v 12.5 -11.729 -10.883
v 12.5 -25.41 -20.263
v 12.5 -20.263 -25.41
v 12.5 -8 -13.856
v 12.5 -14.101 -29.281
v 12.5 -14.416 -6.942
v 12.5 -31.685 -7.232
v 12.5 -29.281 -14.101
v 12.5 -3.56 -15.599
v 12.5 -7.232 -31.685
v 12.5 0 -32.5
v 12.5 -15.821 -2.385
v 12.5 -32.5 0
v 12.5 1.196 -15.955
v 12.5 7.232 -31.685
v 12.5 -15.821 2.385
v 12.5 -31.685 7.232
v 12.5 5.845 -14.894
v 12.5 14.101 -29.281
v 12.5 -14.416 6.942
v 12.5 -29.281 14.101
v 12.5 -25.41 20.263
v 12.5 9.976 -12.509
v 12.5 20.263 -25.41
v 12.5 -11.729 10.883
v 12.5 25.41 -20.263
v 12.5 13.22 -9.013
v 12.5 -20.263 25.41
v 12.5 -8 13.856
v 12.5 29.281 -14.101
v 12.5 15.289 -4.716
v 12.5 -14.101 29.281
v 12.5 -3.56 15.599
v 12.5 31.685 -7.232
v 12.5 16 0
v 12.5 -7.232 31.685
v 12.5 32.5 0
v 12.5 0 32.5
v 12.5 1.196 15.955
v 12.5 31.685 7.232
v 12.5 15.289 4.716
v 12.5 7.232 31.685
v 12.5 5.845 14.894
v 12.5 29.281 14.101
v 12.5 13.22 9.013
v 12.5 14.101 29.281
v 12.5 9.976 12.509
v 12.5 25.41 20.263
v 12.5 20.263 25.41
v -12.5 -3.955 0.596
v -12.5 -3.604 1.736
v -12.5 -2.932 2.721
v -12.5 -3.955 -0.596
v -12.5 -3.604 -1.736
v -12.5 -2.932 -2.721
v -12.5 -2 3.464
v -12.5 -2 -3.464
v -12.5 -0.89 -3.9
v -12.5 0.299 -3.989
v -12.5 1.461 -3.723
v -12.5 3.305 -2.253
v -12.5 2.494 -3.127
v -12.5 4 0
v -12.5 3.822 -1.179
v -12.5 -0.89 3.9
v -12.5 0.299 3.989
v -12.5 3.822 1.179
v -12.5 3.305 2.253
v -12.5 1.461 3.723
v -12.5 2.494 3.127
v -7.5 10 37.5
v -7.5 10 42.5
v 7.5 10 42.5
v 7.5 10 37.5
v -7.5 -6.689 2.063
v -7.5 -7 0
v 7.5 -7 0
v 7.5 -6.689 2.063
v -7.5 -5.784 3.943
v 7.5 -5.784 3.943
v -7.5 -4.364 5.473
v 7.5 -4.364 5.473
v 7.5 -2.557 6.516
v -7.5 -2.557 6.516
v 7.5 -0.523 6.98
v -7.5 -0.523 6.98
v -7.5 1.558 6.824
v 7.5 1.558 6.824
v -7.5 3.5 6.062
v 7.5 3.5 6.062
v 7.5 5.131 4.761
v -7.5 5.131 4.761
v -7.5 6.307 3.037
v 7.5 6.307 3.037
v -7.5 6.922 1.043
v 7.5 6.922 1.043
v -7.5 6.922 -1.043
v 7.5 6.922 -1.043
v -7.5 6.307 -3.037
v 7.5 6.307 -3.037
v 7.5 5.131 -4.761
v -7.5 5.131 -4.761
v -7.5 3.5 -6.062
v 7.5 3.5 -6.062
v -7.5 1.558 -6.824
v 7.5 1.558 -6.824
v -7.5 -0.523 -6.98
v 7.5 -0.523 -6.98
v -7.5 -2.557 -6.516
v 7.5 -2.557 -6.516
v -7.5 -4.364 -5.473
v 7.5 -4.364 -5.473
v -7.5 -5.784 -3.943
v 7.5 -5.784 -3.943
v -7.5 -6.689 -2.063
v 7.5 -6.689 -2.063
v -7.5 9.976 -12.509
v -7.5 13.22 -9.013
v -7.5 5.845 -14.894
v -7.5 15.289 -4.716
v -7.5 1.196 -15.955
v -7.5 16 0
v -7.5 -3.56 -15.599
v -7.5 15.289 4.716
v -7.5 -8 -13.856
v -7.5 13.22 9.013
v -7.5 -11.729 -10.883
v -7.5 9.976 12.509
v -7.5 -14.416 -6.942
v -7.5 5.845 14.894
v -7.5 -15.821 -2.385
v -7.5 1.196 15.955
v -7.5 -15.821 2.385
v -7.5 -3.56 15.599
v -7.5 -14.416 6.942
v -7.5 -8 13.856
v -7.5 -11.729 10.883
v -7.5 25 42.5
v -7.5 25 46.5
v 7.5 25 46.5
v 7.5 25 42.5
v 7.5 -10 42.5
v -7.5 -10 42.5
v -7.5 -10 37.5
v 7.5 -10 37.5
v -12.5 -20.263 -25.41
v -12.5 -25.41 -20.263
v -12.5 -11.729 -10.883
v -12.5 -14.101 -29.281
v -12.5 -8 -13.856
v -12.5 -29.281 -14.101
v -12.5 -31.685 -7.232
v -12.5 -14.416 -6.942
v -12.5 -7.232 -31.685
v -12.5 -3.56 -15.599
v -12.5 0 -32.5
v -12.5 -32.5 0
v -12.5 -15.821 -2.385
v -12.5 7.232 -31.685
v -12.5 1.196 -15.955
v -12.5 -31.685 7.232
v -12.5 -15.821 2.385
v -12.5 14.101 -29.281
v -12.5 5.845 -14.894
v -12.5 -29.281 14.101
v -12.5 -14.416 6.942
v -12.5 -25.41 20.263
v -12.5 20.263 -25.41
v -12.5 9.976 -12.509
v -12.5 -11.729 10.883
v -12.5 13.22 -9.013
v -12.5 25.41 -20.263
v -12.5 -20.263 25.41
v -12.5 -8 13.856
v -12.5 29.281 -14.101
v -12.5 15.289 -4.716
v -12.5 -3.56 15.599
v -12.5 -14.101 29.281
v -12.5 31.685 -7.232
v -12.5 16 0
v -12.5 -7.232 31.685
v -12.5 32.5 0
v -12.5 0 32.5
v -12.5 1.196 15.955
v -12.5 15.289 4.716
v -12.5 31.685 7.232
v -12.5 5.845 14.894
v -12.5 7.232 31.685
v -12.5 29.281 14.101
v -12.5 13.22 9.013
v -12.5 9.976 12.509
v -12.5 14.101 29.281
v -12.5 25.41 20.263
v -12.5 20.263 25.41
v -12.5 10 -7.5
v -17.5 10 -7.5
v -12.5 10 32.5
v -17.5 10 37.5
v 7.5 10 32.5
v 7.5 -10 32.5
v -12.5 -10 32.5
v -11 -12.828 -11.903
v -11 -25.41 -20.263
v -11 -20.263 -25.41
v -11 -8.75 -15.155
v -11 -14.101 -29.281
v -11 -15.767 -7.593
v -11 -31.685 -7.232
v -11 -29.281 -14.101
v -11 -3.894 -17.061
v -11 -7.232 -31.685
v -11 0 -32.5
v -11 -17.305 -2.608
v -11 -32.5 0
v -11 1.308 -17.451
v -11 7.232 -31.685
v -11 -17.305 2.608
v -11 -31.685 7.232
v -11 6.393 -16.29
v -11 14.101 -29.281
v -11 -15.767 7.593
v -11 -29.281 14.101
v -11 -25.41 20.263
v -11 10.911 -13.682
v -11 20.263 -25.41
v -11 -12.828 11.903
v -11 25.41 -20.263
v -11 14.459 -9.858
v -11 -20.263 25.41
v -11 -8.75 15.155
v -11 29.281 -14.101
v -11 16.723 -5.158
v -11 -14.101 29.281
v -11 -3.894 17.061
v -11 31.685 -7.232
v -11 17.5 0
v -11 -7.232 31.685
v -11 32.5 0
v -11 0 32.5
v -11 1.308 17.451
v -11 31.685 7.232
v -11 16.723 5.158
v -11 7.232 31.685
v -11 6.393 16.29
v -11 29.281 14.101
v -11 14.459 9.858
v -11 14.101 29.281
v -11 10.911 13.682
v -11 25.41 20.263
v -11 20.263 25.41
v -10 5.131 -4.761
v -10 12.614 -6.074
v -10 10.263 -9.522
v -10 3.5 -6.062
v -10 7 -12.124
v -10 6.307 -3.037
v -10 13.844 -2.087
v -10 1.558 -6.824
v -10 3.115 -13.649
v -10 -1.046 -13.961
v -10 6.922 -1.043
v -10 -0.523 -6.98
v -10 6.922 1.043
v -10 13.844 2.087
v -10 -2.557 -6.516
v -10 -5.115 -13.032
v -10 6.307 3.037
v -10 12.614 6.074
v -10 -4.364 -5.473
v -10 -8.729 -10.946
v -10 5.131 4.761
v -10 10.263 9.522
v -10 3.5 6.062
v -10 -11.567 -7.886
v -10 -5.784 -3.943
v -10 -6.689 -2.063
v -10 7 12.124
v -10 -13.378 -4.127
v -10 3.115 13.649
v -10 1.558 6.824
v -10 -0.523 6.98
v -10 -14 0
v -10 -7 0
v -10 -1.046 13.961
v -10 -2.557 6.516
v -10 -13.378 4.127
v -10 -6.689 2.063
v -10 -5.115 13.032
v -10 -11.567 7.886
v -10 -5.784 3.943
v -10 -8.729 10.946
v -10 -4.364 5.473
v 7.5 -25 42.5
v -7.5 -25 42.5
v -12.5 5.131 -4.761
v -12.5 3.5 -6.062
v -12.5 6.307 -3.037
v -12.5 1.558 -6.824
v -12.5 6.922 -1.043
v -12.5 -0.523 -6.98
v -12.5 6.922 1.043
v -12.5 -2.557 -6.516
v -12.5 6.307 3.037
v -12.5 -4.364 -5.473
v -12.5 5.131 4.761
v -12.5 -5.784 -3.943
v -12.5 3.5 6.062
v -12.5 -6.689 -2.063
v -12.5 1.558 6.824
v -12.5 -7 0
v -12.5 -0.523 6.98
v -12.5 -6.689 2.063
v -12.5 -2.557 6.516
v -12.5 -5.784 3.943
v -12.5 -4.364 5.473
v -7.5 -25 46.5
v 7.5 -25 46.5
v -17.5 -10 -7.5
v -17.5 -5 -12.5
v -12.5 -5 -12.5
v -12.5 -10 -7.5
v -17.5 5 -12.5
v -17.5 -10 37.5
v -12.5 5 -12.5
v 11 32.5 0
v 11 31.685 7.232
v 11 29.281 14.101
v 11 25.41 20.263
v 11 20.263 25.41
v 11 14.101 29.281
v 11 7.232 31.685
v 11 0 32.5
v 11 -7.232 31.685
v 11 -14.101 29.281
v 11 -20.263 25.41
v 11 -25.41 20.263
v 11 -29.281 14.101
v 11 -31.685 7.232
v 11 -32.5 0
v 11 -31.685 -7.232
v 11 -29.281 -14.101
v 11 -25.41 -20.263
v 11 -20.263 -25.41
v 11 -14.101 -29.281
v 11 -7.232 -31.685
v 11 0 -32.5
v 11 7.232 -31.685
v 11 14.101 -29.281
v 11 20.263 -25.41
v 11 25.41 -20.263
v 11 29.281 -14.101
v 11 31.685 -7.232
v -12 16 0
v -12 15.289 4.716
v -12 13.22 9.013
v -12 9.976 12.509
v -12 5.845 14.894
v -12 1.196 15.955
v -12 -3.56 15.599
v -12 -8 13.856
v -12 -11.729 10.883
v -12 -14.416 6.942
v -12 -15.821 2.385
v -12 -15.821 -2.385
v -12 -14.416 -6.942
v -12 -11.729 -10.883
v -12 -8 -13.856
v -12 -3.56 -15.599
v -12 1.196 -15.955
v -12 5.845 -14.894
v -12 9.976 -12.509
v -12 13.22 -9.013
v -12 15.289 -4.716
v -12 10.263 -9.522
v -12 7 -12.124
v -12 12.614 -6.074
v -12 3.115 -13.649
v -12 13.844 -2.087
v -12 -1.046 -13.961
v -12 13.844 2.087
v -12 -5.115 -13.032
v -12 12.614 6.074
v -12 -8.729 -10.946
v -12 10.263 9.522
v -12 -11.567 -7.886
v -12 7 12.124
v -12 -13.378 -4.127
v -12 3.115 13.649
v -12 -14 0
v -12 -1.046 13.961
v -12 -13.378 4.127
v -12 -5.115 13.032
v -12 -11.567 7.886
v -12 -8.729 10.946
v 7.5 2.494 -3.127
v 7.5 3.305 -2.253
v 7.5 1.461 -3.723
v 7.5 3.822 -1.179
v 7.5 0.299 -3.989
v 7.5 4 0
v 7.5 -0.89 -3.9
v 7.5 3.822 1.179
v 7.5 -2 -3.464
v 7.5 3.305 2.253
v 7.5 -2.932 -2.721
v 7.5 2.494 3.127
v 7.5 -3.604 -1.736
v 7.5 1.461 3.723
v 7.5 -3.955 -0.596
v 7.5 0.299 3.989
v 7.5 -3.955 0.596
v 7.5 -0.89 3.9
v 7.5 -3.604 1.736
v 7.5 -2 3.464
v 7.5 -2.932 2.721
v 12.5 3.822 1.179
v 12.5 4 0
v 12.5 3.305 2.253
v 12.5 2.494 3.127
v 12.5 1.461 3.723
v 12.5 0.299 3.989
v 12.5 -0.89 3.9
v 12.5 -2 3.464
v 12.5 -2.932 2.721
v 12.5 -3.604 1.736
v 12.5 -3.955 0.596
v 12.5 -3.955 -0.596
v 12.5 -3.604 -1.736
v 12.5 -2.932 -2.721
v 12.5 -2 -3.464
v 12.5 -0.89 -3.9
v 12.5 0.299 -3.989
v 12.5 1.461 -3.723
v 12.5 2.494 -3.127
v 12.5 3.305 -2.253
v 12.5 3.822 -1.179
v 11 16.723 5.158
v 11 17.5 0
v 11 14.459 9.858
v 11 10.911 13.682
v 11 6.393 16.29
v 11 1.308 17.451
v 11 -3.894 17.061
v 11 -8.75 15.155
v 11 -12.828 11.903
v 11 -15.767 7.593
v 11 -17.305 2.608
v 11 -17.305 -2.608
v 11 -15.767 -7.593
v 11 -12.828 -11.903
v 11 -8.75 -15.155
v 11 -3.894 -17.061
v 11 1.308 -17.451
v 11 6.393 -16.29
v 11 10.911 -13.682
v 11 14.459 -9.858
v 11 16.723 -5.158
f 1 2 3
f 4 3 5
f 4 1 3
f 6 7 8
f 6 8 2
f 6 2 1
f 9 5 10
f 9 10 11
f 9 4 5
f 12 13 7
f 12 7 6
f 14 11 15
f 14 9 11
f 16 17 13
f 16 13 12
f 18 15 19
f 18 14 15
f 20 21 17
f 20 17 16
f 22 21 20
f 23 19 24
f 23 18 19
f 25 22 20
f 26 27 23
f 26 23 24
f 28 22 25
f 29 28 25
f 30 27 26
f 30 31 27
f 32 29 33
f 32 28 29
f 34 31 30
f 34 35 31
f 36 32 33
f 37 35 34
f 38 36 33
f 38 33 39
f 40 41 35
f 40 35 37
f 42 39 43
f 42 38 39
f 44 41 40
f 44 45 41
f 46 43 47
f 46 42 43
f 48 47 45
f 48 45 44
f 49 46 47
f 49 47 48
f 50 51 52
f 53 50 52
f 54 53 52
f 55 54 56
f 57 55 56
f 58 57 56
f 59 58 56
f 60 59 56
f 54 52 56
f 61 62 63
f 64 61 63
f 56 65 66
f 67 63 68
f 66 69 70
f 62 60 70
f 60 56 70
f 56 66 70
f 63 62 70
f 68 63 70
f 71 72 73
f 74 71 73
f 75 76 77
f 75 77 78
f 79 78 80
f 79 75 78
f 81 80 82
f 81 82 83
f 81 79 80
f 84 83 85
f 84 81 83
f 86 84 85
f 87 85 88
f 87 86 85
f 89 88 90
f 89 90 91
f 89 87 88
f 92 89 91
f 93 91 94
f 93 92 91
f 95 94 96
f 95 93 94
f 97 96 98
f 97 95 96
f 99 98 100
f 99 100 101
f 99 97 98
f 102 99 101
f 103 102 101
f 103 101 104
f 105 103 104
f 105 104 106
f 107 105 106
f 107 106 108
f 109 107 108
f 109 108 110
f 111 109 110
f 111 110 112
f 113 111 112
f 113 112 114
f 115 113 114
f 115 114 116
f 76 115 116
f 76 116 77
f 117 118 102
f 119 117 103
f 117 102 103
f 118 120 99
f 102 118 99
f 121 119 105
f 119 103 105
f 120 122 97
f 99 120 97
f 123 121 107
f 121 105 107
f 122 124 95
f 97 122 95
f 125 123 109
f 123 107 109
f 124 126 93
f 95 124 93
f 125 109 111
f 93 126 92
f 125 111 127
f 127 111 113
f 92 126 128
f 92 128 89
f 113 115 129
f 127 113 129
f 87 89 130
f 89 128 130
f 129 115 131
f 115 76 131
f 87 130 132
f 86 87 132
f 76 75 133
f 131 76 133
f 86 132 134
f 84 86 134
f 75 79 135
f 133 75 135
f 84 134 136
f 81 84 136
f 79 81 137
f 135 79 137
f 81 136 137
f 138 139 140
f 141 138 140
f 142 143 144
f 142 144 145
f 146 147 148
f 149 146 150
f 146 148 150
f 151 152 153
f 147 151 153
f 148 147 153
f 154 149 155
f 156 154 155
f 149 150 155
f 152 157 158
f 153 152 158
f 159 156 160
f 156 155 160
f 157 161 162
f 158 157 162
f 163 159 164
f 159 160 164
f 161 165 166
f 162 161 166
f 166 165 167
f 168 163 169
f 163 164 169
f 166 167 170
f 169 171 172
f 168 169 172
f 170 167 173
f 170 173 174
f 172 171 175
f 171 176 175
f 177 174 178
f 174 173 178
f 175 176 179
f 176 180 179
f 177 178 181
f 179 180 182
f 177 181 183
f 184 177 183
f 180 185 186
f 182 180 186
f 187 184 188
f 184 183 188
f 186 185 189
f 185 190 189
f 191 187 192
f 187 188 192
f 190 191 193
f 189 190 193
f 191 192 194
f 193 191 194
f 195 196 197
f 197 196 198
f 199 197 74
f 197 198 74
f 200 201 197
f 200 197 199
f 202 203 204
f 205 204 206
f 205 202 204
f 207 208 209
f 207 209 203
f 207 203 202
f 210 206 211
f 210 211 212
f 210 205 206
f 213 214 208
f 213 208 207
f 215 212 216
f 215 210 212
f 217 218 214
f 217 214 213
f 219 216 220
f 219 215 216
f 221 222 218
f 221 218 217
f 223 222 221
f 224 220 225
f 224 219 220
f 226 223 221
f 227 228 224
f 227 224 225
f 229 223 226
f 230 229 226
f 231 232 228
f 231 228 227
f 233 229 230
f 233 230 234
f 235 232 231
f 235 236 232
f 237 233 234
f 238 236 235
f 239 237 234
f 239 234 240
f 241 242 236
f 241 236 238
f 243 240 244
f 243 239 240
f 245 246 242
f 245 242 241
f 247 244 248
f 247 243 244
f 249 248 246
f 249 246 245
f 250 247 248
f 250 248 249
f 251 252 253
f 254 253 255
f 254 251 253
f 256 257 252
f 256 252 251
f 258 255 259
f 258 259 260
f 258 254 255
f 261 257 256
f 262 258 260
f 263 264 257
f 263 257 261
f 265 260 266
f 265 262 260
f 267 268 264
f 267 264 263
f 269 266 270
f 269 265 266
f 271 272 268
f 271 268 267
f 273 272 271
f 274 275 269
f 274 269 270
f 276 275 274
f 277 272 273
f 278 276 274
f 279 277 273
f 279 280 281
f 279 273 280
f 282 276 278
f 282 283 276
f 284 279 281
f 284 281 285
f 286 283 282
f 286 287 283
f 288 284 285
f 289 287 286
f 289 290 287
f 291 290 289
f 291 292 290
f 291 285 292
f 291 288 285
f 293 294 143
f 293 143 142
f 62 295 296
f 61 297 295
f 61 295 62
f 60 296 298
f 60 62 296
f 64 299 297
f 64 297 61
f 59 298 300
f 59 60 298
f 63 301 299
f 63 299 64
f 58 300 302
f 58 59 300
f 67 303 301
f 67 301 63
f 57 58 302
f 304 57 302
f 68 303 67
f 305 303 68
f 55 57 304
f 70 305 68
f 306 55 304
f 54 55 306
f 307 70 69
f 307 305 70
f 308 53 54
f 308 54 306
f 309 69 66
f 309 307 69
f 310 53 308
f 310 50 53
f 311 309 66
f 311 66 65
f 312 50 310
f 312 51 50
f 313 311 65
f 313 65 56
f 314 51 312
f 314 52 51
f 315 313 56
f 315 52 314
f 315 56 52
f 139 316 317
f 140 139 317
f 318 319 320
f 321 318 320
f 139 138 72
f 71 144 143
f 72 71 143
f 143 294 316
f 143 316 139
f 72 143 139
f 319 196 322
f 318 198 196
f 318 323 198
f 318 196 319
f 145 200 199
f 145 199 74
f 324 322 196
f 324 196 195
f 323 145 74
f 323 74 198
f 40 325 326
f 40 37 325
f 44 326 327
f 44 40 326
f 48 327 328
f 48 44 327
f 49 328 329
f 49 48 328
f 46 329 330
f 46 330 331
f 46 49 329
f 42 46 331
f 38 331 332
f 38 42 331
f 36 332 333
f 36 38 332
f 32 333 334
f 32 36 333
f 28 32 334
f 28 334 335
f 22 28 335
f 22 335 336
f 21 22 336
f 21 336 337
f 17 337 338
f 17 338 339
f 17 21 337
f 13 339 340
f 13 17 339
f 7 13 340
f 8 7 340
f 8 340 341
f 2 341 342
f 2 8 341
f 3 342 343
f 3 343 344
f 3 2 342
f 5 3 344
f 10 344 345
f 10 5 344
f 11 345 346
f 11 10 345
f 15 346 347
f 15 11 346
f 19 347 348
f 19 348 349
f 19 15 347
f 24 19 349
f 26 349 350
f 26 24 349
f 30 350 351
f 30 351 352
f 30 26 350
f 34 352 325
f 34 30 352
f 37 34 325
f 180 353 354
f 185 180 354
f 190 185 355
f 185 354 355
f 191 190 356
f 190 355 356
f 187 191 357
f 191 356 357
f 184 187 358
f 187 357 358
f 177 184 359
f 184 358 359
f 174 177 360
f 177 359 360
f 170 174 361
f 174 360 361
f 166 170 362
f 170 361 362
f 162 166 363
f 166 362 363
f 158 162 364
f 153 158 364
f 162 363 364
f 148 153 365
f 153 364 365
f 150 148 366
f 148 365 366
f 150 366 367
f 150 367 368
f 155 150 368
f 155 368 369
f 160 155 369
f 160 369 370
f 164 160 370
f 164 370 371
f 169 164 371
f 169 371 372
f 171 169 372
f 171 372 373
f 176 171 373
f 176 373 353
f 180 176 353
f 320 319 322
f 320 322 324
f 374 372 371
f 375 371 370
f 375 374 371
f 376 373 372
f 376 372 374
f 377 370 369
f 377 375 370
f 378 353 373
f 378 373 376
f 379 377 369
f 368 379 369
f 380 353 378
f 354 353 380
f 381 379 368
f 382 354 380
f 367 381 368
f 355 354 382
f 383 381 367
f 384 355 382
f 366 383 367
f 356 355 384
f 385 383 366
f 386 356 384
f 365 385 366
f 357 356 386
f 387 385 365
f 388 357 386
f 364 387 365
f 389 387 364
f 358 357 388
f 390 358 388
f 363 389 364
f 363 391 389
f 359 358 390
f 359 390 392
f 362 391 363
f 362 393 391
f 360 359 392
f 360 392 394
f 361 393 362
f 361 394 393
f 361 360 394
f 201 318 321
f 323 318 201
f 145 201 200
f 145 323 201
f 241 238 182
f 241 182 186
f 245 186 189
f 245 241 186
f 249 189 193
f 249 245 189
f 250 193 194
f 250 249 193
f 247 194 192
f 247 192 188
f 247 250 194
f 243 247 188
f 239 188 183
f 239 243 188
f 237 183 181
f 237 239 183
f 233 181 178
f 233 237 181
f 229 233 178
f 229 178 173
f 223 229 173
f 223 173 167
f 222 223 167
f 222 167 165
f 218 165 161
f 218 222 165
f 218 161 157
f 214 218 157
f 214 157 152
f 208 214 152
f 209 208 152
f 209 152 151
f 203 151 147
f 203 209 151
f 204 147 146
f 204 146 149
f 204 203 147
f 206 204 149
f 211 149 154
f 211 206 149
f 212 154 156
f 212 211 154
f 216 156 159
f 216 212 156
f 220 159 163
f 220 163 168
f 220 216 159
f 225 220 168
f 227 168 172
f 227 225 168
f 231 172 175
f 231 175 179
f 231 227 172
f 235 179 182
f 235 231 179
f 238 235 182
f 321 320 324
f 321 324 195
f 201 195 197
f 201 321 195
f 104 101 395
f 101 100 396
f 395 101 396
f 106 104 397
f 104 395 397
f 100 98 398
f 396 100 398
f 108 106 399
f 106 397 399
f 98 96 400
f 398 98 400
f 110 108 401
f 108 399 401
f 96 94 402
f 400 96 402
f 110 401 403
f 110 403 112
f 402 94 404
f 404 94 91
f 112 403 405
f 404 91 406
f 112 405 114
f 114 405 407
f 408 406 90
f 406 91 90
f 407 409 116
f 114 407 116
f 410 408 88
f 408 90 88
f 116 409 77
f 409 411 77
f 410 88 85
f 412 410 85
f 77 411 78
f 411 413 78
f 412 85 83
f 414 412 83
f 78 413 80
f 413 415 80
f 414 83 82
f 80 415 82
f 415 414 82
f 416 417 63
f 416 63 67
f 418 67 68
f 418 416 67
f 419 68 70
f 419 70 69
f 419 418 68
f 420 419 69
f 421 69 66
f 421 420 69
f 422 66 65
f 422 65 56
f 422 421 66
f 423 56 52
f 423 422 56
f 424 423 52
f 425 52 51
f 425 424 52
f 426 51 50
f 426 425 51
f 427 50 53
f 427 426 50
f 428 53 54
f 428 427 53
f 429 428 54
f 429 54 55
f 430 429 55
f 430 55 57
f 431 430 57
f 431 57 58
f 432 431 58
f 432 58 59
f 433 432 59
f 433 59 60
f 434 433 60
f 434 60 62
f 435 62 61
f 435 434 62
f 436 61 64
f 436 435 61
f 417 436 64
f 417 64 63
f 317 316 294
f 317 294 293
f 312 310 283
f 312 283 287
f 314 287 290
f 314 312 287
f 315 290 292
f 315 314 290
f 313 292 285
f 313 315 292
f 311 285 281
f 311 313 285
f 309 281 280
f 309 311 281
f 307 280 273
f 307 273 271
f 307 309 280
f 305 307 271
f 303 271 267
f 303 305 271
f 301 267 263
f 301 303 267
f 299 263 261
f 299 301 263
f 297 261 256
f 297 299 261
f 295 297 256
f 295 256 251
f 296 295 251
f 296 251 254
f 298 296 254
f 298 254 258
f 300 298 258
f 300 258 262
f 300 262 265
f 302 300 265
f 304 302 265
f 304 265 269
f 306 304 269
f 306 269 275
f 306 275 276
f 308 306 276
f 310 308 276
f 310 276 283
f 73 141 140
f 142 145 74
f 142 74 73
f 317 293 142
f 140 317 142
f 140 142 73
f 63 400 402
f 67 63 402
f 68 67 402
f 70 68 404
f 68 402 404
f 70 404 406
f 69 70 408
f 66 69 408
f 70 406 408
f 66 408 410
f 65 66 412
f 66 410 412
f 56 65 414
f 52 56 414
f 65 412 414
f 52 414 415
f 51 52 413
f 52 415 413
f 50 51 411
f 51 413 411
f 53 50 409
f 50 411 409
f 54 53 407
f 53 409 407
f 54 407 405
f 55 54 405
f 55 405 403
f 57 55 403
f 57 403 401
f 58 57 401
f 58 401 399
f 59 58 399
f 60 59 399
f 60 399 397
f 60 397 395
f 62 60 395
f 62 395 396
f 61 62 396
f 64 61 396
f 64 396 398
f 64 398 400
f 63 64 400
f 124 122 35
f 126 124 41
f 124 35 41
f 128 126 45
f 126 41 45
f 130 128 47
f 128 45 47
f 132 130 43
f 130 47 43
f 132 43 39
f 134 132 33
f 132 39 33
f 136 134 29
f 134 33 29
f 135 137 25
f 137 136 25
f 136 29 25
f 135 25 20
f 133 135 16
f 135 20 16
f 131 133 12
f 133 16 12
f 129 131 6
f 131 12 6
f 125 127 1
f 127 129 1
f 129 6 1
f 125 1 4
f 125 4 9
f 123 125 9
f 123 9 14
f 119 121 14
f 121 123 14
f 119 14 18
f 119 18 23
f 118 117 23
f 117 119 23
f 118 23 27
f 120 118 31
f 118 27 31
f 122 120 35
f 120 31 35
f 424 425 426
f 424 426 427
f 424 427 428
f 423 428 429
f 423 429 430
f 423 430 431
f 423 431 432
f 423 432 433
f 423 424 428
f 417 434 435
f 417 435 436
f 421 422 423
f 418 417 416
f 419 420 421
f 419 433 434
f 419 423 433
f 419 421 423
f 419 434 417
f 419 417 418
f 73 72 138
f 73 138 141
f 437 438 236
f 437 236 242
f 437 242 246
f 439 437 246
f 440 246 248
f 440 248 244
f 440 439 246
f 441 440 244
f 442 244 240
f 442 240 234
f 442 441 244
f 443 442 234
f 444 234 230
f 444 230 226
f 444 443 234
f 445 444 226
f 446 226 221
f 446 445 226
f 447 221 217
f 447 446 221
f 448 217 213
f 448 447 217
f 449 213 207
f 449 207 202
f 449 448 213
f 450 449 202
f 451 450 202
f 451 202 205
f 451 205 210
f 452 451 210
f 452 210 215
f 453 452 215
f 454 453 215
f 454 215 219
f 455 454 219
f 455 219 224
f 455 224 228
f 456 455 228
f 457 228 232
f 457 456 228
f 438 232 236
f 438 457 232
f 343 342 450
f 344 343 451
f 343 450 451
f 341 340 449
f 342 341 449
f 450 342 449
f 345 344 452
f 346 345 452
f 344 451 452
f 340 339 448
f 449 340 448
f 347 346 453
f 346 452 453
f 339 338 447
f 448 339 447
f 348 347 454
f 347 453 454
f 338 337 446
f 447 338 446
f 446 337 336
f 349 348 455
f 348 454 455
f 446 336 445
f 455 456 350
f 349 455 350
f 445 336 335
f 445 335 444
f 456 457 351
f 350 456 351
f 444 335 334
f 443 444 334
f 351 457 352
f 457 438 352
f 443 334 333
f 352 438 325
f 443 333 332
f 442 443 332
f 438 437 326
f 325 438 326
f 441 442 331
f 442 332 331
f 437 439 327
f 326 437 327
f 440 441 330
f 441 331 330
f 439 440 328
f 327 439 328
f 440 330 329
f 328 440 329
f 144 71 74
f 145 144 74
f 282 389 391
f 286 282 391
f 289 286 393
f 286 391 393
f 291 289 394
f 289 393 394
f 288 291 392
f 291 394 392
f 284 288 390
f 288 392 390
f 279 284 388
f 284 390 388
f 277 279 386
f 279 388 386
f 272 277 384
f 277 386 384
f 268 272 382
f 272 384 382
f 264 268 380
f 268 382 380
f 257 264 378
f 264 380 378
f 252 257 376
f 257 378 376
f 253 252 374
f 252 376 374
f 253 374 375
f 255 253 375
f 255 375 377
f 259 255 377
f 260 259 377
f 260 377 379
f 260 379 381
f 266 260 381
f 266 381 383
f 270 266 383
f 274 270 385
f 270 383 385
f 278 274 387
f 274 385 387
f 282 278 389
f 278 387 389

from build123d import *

# Parameters (mm, degrees)
F0_R      = 32.5
F1_DEPTH  = 12.5
F3_DEPTH  = 10
F2_W      = 7.5
F2_H      = 4
F4_DEPTH  = 25
F5_W      = 15
F5_H      = 20
F6_DEPTH  = 9
F7_R      = 4
F8_DEPTH  = 25
F9_START  = -1.5
F7_R_2    = 32.5
F7_R_3    = 17.5
F9_DEPTH  = 22
F7_R_4    = 16
F10_DEPTH = 25
F11_SIZE  = 5
F13_START = -0.5
F12_R     = 16
F12_R_2   = 14
F13_DEPTH = 2
F14_START = -2.5
F12_R_3   = 7
F14_DEPTH = 2.5
F15_DEPTH = 20
F16_DEPTH = 25


with BuildPart() as f1:
    # F0 (on Right) → F1 (new body, symmetric)
    with BuildSketch(Plane.YZ):
        Circle(F0_R)
    extrude(amount=F1_DEPTH, both=True)

    # F7 (on face) → F9 (cut)
    with BuildSketch(Plane.YZ.offset(12.5).offset(F9_START)):
        Circle(F7_R_2)
        Circle(F7_R_3, mode=Mode.SUBTRACT)
    extrude(amount=-F9_DEPTH, mode=Mode.SUBTRACT)

    # F7 (on face) → F10 (cut)
    with BuildSketch(Plane.YZ.offset(12.5)):
        Circle(F7_R_4)
        Circle(F7_R, mode=Mode.SUBTRACT)
        Circle(F7_R)
    extrude(amount=-F10_DEPTH, mode=Mode.SUBTRACT)

    # F12 (on face) → F13 (join)
    with BuildSketch(Plane(origin=(-12.5, 0, 0), x_dir=(0, -1, 0), z_dir=(-1, 0, 0)).offset(F13_START)):
        Circle(F12_R)
        Circle(F12_R_2, mode=Mode.SUBTRACT)
    extrude(amount=-F13_DEPTH)

    # F12 (on face) → F14 (join)
    with BuildSketch(Plane(origin=(-12.5, 0, 0), x_dir=(0, -1, 0), z_dir=(-1, 0, 0)).offset(F14_START)):
        Circle(F12_R)
        Circle(F12_R_2, mode=Mode.SUBTRACT)
        Circle(F12_R_2)
        Circle(F12_R_3, mode=Mode.SUBTRACT)
        Circle(F12_R_3)
    extrude(amount=-F14_DEPTH)

    # F12 (on face) → F15 (join)
    with BuildSketch(Plane(origin=(-12.5, 0, 0), x_dir=(0, -1, 0), z_dir=(-1, 0, 0))):
        Circle(F12_R_3)
    extrude(amount=-F15_DEPTH)

    # F7 (on face) → F16 (cut)
    with BuildSketch(Plane.YZ.offset(12.5)):
        Circle(F7_R)
    extrude(amount=-F16_DEPTH, mode=Mode.SUBTRACT)


with BuildPart() as f3:
    # F2 (on Front) → F3 (new body, symmetric)
    with BuildSketch(Plane.XZ):
        Polygon((-12.5, -12.5), (-12.5, 32.5), (7.5, 32.5), (7.5, 37.5000014901), (-17.5, 37.5000014901), (-17.5, -12.5), align=None)
    extrude(amount=F3_DEPTH, both=True)

    # F11
    f11_edges = [f3.edges().sort_by_distance(p)[0] for p in [
        (-15, 10, -12.5),
        (-15, -10, -12.5),
    ]]
    chamfer(f11_edges, length=F11_SIZE)


with BuildPart() as f4:
    # F2 (on Front) → F4 (new body, symmetric)
    with BuildSketch(Plane.XZ):
        with Locations((-3.75, 44.5000014901)):
            Rectangle(F2_W, F2_H)
        with Locations((3.75, 44.5000014901)):
            Rectangle(F2_W, F2_H)
    extrude(amount=F4_DEPTH, both=True)

    # F5 (on face) → F6 (join, through all)
    with BuildSketch(Plane.XY.offset(46.5000014901)):
        Rectangle(F5_W, F5_H)
    extrude(amount=-F6_DEPTH)


with BuildPart() as f8:
    # F7 (on face) → F8 (new body, through all)
    with BuildSketch(Plane.YZ.offset(12.5)):
        Circle(F7_R)
    extrude(amount=-F8_DEPTH)


solid = Compound([f1.part, f3.part, f4.part, f8.part])
